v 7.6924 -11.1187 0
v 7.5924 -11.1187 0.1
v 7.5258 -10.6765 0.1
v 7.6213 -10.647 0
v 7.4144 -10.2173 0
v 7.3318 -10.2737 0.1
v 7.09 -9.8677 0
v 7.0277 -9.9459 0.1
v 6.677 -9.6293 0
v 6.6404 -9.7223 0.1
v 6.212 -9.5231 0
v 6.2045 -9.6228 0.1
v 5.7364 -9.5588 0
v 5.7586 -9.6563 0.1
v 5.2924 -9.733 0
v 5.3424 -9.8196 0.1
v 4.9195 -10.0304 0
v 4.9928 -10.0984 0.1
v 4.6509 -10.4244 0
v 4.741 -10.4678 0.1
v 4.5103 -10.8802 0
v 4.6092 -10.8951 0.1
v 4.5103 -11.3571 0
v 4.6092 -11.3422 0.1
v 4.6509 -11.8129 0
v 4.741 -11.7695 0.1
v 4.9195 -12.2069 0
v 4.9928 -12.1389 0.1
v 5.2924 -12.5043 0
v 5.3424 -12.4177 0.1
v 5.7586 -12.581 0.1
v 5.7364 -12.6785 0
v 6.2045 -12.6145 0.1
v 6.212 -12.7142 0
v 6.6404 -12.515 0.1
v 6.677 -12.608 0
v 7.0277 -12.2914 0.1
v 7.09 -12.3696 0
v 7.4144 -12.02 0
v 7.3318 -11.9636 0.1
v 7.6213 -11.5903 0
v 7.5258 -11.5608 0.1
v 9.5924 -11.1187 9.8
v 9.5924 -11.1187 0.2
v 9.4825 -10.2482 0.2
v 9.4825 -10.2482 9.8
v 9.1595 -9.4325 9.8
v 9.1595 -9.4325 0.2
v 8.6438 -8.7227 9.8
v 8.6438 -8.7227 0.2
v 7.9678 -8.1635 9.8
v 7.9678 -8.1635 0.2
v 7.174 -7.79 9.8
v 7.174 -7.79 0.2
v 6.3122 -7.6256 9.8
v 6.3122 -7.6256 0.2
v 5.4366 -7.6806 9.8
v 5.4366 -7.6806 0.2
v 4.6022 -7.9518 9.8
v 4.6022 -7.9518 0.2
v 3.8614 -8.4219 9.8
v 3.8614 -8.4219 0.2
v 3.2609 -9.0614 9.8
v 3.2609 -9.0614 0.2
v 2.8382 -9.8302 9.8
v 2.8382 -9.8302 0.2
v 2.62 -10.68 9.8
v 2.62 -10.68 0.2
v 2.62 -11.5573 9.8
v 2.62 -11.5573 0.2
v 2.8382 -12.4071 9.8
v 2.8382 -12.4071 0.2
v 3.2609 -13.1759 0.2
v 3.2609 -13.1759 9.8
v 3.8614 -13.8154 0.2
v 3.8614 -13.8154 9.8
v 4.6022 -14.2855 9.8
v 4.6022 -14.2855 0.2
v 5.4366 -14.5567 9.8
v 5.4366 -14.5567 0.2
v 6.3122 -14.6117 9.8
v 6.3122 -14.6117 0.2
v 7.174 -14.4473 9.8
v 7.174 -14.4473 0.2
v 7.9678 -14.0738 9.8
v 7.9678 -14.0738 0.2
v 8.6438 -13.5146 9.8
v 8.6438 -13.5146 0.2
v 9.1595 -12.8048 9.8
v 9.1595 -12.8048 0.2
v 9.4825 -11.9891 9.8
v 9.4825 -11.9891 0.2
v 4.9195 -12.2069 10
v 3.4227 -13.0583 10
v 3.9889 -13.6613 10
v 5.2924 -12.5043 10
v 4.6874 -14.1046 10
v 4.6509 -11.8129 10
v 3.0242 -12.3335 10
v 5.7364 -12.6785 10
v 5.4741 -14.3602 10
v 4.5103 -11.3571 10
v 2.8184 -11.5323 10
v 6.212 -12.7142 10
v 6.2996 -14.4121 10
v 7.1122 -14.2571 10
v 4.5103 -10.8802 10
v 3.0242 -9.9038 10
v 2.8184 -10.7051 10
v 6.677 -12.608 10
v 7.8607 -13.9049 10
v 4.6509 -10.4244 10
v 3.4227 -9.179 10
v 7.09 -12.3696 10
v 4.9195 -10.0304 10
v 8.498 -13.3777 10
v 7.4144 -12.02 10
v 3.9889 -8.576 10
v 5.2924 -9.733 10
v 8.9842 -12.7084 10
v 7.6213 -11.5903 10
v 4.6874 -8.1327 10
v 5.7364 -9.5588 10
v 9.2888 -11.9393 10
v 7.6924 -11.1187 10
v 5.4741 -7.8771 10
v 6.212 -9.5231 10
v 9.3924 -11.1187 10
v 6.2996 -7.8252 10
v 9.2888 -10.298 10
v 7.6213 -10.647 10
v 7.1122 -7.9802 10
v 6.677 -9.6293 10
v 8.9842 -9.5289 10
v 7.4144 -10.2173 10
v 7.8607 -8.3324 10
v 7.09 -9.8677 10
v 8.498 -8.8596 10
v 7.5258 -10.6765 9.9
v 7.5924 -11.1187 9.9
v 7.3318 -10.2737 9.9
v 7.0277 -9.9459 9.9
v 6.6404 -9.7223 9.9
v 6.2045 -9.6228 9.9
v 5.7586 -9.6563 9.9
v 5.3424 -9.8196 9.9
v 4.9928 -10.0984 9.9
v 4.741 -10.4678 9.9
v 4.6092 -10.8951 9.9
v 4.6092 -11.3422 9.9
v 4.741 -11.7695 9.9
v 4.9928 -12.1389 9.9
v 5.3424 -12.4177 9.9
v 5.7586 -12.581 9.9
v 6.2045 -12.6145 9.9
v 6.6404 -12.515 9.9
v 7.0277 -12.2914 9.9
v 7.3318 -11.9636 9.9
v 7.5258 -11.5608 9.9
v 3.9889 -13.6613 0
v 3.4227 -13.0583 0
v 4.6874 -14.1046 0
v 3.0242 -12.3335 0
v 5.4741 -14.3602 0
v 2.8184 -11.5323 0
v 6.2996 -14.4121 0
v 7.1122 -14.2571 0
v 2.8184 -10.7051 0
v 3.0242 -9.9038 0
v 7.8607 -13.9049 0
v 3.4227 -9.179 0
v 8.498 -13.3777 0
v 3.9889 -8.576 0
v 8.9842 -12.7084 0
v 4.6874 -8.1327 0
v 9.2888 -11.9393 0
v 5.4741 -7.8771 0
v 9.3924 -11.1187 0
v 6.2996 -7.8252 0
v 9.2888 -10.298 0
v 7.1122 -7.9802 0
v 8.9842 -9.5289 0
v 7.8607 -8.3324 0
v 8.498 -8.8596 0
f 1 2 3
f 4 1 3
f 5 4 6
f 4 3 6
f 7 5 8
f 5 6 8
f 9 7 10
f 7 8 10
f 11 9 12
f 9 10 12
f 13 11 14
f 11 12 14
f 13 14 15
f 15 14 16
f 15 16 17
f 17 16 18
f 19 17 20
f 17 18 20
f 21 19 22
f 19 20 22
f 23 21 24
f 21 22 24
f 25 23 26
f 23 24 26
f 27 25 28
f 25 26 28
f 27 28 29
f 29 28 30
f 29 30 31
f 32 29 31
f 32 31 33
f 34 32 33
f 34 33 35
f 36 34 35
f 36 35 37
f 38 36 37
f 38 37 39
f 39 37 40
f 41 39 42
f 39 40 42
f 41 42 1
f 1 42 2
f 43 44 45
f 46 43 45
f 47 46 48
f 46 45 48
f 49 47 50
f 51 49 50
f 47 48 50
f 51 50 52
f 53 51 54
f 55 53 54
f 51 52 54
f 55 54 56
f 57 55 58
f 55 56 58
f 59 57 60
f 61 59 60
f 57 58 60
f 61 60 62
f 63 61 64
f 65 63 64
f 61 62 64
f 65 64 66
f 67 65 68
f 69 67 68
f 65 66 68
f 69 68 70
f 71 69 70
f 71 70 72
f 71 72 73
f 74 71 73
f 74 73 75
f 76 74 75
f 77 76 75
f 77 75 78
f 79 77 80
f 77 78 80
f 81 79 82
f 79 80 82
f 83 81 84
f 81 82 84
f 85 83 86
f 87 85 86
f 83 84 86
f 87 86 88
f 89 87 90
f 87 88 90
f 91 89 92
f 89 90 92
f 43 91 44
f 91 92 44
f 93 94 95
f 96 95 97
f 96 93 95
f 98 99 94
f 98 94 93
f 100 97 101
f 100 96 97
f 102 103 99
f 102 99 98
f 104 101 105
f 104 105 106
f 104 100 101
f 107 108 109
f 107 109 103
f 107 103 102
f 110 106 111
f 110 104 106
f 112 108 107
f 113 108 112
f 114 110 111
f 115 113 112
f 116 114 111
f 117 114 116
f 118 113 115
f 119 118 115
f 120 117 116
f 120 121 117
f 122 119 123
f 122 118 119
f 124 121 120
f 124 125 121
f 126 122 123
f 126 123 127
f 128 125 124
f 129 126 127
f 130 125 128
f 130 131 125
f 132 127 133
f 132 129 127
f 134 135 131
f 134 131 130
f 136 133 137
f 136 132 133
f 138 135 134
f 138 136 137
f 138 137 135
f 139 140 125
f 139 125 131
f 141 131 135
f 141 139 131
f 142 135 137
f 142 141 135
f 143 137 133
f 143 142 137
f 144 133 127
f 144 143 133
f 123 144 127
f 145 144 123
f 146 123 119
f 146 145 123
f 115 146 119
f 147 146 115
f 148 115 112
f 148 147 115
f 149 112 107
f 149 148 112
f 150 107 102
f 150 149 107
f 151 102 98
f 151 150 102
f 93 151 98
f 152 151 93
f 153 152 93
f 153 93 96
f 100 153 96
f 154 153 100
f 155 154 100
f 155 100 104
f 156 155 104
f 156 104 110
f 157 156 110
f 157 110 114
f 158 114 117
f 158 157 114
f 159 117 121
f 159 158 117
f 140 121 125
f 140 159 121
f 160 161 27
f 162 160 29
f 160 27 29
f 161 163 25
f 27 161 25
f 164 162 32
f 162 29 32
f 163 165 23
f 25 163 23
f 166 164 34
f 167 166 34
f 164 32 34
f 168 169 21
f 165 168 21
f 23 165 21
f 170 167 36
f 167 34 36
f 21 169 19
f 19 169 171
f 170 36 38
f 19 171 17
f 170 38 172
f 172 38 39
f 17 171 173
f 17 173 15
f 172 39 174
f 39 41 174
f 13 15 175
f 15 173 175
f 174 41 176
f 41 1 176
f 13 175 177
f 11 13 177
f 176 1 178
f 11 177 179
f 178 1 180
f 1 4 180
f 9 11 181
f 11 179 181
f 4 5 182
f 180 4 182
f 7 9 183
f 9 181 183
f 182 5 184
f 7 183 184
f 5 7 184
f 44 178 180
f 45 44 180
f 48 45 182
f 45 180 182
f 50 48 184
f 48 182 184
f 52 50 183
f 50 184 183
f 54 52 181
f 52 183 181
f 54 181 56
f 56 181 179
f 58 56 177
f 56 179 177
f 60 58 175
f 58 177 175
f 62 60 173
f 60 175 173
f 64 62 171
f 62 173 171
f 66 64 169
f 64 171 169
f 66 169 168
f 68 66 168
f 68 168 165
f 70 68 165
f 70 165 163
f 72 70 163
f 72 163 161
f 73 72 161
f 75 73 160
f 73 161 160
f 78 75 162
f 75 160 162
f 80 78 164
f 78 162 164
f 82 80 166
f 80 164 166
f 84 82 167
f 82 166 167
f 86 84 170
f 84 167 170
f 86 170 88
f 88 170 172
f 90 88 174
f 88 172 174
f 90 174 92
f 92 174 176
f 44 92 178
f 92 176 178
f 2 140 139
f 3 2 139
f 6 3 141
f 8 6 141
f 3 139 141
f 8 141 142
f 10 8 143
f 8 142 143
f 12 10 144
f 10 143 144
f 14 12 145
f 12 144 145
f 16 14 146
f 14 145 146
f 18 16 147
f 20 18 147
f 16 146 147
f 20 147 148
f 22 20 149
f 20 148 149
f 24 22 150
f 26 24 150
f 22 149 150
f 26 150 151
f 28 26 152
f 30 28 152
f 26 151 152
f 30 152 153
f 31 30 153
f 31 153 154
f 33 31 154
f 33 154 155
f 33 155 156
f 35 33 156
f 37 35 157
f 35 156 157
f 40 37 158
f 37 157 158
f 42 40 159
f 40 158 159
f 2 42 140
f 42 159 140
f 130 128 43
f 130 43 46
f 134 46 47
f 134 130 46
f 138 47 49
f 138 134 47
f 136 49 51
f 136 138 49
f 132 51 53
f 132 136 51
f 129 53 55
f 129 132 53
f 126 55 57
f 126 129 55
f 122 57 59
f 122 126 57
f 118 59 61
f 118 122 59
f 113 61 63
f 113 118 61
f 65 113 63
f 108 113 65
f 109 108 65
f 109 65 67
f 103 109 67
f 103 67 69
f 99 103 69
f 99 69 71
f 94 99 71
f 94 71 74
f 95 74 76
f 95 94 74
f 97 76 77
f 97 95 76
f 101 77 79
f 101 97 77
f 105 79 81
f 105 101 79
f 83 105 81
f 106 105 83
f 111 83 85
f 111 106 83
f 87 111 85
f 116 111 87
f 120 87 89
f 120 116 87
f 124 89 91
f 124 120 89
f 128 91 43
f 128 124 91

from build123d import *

# Parameters (mm, degrees)
SKETCH2_R           = 3.5
BOSS_EXTRUDE1_DEPTH = 10
SKETCH3_R           = 1.5
CUT_EXTRUDE1_DEPTH  = 10
CHAMFER1_SIZE       = 0.2
CHAMFER2_SIZE       = 0.1


with BuildPart() as part:
    # Sketch2 → Boss-Extrude1 (new body)
    with BuildSketch(Plane.XY):
        with Locations((6.092427376, -11.118651223)):
            Circle(SKETCH2_R)
    extrude(amount=BOSS_EXTRUDE1_DEPTH)

    # Sketch3 → Cut-Extrude1 (cut)
    with BuildSketch(Plane.XY.offset(10)):
        with Locations((6.092427376, -11.118651223)):
            Circle(SKETCH3_R)
    extrude(amount=-CUT_EXTRUDE1_DEPTH, mode=Mode.SUBTRACT)

    # Chamfer1
    chamfer1_edges = [part.edges().sort_by_distance(p)[0] for p in [
        (2.592427376, -11.118651223, 0),
        (2.592427376, -11.118651223, 10),
    ]]
    chamfer(chamfer1_edges, length=CHAMFER1_SIZE)

    # Chamfer2
    chamfer2_edges = [part.edges().sort_by_distance(p)[0] for p in [
        (4.592427376, -11.118651223, 0),
        (4.592427376, -11.118651223, 10),
    ]]
    chamfer(chamfer2_edges, length=CHAMFER2_SIZE)


solid = part.part
